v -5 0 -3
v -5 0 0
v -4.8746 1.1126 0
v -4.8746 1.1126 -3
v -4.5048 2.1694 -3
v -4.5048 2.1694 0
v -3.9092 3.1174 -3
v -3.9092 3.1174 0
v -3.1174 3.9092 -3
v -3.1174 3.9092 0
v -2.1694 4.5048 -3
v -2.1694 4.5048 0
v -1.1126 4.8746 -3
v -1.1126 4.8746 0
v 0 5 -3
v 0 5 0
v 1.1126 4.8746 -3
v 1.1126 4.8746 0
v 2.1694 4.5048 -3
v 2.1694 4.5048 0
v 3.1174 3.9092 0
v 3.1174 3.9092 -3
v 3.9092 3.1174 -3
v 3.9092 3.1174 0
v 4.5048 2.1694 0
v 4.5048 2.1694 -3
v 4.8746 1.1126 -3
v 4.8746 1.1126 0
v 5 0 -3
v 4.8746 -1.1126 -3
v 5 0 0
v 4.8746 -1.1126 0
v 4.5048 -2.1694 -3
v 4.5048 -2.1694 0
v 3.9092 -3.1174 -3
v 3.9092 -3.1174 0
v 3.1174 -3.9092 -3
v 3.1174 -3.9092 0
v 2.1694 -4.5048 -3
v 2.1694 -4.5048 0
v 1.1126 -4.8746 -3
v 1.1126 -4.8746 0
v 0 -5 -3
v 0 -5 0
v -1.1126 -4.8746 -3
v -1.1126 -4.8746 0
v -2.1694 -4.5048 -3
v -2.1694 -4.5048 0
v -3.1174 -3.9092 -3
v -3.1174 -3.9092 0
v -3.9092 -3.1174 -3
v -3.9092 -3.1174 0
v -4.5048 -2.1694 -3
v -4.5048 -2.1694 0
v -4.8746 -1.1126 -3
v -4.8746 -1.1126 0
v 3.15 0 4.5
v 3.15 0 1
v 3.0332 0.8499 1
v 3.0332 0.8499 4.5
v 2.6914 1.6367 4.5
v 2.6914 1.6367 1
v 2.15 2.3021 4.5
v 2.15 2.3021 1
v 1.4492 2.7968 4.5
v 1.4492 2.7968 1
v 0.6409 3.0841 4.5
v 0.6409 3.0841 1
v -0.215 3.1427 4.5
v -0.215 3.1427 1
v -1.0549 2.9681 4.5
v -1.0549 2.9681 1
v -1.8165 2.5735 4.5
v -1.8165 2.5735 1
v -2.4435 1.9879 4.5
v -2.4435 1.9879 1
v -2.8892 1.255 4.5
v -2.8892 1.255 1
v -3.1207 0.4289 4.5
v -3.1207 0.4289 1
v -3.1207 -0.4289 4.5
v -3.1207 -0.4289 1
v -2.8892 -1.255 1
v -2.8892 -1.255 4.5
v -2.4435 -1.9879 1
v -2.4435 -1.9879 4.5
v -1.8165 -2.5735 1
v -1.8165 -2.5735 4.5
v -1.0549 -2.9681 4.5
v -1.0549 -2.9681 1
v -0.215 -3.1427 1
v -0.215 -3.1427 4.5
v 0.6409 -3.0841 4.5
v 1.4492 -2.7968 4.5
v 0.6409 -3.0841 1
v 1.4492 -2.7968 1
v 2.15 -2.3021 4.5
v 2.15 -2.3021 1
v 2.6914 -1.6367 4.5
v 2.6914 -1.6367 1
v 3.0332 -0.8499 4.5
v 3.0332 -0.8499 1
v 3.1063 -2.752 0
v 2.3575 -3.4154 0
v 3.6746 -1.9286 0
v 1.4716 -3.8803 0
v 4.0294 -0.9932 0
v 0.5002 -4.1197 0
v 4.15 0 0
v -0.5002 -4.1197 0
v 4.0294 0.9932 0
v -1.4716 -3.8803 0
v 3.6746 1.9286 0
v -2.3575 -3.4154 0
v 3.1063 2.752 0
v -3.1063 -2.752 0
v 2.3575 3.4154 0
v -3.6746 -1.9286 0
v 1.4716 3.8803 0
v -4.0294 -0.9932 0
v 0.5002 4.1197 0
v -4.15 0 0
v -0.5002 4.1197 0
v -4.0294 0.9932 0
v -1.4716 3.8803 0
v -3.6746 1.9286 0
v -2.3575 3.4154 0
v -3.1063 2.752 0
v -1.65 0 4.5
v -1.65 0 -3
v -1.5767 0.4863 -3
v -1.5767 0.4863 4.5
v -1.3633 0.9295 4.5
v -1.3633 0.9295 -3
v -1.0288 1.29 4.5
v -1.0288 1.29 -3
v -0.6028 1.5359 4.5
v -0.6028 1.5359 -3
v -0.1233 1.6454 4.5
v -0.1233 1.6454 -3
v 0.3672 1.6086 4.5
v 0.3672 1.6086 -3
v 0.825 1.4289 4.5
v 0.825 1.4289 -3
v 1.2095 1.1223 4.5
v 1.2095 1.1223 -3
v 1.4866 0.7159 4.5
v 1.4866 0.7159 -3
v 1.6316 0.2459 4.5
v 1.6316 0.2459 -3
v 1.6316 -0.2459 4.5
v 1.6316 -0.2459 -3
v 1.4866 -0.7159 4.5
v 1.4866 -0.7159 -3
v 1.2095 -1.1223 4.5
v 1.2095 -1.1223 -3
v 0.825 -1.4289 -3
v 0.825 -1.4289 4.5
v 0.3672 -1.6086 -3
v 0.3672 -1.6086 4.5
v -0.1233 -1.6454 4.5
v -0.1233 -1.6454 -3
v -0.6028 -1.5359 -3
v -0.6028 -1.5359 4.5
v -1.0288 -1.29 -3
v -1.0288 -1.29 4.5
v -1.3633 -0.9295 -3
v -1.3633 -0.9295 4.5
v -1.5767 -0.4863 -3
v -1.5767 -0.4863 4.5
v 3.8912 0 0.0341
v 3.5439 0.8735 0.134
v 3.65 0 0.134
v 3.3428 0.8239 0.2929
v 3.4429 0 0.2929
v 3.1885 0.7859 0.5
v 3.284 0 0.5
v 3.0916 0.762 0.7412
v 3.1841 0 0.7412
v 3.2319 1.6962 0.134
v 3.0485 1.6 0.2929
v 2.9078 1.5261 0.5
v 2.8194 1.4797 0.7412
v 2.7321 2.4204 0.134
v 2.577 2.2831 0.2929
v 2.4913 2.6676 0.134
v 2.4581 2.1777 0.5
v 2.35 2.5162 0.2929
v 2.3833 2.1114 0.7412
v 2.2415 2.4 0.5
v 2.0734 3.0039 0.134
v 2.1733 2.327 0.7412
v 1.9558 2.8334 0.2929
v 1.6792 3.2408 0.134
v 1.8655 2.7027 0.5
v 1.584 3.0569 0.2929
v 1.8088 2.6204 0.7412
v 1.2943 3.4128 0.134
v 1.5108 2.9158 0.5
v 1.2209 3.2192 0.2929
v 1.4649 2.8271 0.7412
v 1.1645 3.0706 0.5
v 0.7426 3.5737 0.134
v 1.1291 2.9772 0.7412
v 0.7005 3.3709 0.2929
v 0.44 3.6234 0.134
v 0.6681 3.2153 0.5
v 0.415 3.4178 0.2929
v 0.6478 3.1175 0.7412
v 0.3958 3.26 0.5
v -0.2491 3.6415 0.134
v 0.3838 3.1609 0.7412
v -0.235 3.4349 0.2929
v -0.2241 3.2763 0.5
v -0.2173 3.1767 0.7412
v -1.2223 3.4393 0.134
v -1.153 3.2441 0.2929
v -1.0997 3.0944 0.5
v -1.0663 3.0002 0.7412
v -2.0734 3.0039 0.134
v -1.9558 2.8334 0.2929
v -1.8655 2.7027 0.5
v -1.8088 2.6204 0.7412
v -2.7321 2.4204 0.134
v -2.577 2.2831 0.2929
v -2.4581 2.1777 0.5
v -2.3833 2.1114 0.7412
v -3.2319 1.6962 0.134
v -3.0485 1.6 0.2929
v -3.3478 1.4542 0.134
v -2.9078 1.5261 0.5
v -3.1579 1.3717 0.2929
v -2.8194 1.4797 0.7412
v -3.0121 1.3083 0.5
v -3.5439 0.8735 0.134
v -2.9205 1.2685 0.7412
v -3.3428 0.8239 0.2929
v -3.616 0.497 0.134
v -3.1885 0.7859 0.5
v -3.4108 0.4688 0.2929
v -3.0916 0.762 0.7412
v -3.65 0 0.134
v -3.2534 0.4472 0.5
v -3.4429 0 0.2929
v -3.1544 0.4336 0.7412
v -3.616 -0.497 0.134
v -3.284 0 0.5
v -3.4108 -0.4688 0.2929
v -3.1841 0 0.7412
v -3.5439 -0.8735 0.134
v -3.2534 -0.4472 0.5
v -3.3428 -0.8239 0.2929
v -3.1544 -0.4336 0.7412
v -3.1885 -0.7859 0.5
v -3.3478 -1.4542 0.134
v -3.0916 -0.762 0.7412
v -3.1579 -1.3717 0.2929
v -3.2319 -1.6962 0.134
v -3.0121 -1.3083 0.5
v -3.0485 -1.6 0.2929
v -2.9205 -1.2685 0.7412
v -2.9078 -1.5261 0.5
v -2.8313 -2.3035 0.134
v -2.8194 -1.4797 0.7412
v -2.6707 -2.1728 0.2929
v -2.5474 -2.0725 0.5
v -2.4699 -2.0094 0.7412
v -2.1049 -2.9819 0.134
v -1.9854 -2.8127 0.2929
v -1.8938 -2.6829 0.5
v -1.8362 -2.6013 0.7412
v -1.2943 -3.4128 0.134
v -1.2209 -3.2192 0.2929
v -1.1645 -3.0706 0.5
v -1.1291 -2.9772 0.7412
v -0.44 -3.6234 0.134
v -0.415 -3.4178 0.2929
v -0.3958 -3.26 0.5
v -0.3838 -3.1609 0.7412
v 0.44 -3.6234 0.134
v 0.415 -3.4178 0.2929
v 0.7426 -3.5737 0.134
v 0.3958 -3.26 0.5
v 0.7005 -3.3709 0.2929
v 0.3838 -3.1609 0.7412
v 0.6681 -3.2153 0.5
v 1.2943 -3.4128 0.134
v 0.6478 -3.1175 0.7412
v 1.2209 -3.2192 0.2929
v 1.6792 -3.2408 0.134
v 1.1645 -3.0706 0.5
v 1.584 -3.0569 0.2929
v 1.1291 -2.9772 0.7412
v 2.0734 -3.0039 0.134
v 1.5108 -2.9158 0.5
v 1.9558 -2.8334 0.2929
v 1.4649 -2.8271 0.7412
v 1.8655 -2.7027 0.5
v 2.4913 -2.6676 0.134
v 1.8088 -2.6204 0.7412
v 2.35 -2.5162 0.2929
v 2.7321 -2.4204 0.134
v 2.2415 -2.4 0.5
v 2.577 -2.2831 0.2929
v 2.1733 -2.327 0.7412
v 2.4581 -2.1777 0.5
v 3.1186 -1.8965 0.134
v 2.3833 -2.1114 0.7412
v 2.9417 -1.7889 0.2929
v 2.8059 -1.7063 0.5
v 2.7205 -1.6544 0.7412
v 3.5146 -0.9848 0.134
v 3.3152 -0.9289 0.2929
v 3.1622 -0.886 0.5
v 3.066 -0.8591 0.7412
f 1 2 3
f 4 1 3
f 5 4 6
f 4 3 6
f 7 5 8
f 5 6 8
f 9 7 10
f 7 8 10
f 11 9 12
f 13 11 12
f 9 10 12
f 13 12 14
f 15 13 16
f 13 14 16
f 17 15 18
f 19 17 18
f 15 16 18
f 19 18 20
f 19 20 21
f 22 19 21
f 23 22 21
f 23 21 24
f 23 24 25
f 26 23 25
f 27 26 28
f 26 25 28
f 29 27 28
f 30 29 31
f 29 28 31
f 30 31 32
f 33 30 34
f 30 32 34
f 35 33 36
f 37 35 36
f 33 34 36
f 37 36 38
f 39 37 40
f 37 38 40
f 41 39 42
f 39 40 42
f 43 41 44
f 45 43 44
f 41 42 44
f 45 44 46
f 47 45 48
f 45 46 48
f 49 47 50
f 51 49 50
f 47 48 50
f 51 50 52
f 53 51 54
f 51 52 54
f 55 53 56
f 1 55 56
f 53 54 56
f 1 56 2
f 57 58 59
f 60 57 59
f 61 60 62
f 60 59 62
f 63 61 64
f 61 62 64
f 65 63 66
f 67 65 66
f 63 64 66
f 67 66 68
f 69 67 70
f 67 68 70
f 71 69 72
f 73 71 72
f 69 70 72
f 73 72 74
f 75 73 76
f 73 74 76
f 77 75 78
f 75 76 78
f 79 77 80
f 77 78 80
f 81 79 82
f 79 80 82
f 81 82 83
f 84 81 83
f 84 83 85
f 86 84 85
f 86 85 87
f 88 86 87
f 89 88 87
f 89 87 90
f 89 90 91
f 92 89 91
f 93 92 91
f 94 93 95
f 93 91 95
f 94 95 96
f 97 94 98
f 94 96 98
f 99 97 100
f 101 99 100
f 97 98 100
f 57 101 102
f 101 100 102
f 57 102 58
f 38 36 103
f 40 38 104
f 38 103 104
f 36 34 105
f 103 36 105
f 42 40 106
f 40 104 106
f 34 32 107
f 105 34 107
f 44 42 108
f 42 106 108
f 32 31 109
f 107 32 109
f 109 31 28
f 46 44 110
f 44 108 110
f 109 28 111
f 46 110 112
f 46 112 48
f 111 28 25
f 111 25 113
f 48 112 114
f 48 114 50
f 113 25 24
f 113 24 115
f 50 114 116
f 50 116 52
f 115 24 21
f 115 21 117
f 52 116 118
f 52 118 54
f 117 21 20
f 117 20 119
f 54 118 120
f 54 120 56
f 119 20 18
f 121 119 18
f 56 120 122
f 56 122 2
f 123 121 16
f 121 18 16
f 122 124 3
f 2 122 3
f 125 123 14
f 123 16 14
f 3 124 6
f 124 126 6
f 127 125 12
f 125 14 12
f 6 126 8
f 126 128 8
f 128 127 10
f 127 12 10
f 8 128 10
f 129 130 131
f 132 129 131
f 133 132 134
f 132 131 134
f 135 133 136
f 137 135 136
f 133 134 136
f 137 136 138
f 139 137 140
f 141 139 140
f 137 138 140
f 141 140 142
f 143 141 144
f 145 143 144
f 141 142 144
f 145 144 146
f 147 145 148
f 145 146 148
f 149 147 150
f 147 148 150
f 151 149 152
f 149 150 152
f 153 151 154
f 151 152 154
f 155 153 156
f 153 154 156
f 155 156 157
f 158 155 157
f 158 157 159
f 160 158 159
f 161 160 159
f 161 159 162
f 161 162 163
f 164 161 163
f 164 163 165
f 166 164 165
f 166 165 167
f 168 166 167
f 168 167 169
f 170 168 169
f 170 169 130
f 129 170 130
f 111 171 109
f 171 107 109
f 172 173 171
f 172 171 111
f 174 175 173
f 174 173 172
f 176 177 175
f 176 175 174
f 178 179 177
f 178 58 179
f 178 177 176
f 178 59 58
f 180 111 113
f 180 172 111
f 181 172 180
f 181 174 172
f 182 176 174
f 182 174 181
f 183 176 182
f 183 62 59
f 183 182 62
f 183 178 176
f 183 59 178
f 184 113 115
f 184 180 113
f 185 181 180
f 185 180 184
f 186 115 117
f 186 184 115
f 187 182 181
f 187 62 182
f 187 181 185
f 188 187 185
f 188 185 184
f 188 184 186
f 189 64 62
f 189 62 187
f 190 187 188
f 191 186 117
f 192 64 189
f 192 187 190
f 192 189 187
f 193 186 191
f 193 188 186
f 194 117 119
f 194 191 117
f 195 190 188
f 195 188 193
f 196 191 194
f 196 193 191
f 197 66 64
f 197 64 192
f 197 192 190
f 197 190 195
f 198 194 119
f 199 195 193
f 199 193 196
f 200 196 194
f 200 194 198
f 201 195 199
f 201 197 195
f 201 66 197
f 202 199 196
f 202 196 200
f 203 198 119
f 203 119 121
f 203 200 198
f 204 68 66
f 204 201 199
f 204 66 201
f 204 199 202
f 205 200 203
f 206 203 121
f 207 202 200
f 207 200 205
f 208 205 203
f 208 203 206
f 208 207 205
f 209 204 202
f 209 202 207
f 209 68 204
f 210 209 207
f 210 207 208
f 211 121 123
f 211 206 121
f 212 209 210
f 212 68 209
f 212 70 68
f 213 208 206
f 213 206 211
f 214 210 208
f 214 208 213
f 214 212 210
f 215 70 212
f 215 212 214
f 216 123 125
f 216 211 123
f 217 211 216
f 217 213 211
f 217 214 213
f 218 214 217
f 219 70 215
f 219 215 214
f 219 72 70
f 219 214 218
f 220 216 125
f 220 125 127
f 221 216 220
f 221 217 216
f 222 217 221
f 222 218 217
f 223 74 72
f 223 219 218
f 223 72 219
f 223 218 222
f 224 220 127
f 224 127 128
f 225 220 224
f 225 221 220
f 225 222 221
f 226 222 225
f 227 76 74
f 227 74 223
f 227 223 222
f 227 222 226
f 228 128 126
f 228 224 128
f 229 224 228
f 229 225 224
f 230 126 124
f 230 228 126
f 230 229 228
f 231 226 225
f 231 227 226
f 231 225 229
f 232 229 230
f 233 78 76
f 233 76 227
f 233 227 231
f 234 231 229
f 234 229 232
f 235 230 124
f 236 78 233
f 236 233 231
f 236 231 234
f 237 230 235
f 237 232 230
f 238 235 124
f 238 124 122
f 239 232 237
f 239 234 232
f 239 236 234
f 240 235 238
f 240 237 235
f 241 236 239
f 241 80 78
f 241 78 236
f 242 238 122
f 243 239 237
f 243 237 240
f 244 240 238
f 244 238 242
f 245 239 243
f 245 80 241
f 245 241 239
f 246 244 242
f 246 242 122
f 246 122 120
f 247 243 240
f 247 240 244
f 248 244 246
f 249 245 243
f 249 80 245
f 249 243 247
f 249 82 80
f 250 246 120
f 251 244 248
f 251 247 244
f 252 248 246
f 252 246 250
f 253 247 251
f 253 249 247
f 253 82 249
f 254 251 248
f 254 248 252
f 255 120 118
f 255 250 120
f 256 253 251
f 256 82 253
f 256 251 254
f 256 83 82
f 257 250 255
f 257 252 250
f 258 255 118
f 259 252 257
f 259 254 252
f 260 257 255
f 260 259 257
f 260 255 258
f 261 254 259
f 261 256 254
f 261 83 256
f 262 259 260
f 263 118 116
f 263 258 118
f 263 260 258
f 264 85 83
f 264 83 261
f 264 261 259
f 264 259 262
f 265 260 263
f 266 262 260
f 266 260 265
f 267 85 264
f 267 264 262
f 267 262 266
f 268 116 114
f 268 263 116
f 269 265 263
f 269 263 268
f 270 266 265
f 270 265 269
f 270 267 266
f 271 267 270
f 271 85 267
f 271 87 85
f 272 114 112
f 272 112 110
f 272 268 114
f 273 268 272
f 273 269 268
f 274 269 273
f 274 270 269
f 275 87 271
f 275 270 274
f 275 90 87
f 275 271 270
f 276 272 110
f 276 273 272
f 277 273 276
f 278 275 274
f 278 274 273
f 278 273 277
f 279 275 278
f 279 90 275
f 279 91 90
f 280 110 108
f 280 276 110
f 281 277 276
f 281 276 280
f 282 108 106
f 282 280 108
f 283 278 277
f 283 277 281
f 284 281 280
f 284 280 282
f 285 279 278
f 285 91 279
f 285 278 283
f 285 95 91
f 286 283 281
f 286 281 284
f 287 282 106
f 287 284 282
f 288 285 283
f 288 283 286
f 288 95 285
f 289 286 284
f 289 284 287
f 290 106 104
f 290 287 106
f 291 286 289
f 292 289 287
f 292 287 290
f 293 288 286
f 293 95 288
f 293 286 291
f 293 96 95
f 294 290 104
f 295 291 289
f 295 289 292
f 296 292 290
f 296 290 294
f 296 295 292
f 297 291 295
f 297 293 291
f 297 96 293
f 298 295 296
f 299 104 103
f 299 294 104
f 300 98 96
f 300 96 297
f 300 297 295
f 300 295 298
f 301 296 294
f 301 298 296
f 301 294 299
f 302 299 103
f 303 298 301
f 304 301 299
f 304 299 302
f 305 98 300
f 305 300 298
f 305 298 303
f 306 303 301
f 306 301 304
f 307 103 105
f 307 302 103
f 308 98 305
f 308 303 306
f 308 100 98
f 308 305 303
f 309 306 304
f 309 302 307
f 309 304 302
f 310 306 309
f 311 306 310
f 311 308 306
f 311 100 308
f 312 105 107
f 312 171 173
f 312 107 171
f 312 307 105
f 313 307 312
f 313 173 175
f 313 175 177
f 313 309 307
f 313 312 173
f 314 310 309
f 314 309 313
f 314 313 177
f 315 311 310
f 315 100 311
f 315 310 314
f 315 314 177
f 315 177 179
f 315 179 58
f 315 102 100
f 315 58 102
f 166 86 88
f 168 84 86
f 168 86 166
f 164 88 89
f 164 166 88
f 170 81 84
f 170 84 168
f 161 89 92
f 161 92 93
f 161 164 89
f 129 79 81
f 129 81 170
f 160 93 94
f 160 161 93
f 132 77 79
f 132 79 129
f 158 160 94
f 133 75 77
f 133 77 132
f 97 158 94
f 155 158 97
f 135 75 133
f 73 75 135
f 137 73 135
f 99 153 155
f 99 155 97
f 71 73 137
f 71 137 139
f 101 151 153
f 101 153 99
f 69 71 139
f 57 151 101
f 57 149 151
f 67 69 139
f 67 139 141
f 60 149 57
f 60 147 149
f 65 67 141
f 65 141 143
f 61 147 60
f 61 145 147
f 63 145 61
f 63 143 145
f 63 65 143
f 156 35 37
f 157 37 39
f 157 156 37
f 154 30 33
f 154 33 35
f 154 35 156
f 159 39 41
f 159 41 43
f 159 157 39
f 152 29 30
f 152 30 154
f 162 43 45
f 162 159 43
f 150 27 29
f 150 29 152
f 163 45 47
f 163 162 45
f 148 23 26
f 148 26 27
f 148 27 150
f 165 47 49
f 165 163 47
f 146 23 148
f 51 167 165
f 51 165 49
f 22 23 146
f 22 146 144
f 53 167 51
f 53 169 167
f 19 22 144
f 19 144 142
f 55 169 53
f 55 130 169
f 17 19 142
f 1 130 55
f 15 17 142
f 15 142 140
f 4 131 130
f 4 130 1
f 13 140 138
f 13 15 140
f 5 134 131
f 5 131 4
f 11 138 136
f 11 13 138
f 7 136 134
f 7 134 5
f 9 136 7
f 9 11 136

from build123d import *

# Parameters (mm, degrees)
SKETCH1_R           = 3.15
BOSS_EXTRUDE1_DEPTH = 4.5
SKETCH2_R           = 5
BOSS_EXTRUDE2_DEPTH = 3
FILLET1_R           = 1
CUT_EXTRUDE1_REACH  = 12.308
SKETCH3_R           = 1.65


with BuildPart() as part:
    # Sketch1 → Boss-Extrude1 (new body)
    with BuildSketch(Plane.XY):
        Circle(SKETCH1_R)
    extrude(amount=BOSS_EXTRUDE1_DEPTH)

    # Sketch2 → Boss-Extrude2 (add)
    with BuildSketch(Plane(origin=(0, 0, 0), x_dir=(-1, 0, 0), z_dir=(0, 0, -1))):
        Circle(SKETCH2_R)
    extrude(amount=BOSS_EXTRUDE2_DEPTH)

    # Fillet1
    fillet1_edges = [part.edges().sort_by_distance(p)[0] for p in [
        (-3.15, 0, 0),
    ]]
    fillet(fillet1_edges, radius=FILLET1_R)

    # Sketch3 → Cut-Extrude1 (cut, up to next)
    with BuildSketch(Plane(origin=(0, 0, -3), x_dir=(-1, 0, 0), z_dir=(0, 0, -1)), mode=Mode.PRIVATE) as cut_extrude1_sk1:
        Circle(SKETCH3_R)
    cut_extrude1_tool1 = extrude(cut_extrude1_sk1.sketch, amount=-CUT_EXTRUDE1_REACH, mode=Mode.PRIVATE) & part.part
    add(cut_extrude1_tool1.solids().sort_by_distance((0, 0, -3))[0], mode=Mode.SUBTRACT)


solid = part.part
